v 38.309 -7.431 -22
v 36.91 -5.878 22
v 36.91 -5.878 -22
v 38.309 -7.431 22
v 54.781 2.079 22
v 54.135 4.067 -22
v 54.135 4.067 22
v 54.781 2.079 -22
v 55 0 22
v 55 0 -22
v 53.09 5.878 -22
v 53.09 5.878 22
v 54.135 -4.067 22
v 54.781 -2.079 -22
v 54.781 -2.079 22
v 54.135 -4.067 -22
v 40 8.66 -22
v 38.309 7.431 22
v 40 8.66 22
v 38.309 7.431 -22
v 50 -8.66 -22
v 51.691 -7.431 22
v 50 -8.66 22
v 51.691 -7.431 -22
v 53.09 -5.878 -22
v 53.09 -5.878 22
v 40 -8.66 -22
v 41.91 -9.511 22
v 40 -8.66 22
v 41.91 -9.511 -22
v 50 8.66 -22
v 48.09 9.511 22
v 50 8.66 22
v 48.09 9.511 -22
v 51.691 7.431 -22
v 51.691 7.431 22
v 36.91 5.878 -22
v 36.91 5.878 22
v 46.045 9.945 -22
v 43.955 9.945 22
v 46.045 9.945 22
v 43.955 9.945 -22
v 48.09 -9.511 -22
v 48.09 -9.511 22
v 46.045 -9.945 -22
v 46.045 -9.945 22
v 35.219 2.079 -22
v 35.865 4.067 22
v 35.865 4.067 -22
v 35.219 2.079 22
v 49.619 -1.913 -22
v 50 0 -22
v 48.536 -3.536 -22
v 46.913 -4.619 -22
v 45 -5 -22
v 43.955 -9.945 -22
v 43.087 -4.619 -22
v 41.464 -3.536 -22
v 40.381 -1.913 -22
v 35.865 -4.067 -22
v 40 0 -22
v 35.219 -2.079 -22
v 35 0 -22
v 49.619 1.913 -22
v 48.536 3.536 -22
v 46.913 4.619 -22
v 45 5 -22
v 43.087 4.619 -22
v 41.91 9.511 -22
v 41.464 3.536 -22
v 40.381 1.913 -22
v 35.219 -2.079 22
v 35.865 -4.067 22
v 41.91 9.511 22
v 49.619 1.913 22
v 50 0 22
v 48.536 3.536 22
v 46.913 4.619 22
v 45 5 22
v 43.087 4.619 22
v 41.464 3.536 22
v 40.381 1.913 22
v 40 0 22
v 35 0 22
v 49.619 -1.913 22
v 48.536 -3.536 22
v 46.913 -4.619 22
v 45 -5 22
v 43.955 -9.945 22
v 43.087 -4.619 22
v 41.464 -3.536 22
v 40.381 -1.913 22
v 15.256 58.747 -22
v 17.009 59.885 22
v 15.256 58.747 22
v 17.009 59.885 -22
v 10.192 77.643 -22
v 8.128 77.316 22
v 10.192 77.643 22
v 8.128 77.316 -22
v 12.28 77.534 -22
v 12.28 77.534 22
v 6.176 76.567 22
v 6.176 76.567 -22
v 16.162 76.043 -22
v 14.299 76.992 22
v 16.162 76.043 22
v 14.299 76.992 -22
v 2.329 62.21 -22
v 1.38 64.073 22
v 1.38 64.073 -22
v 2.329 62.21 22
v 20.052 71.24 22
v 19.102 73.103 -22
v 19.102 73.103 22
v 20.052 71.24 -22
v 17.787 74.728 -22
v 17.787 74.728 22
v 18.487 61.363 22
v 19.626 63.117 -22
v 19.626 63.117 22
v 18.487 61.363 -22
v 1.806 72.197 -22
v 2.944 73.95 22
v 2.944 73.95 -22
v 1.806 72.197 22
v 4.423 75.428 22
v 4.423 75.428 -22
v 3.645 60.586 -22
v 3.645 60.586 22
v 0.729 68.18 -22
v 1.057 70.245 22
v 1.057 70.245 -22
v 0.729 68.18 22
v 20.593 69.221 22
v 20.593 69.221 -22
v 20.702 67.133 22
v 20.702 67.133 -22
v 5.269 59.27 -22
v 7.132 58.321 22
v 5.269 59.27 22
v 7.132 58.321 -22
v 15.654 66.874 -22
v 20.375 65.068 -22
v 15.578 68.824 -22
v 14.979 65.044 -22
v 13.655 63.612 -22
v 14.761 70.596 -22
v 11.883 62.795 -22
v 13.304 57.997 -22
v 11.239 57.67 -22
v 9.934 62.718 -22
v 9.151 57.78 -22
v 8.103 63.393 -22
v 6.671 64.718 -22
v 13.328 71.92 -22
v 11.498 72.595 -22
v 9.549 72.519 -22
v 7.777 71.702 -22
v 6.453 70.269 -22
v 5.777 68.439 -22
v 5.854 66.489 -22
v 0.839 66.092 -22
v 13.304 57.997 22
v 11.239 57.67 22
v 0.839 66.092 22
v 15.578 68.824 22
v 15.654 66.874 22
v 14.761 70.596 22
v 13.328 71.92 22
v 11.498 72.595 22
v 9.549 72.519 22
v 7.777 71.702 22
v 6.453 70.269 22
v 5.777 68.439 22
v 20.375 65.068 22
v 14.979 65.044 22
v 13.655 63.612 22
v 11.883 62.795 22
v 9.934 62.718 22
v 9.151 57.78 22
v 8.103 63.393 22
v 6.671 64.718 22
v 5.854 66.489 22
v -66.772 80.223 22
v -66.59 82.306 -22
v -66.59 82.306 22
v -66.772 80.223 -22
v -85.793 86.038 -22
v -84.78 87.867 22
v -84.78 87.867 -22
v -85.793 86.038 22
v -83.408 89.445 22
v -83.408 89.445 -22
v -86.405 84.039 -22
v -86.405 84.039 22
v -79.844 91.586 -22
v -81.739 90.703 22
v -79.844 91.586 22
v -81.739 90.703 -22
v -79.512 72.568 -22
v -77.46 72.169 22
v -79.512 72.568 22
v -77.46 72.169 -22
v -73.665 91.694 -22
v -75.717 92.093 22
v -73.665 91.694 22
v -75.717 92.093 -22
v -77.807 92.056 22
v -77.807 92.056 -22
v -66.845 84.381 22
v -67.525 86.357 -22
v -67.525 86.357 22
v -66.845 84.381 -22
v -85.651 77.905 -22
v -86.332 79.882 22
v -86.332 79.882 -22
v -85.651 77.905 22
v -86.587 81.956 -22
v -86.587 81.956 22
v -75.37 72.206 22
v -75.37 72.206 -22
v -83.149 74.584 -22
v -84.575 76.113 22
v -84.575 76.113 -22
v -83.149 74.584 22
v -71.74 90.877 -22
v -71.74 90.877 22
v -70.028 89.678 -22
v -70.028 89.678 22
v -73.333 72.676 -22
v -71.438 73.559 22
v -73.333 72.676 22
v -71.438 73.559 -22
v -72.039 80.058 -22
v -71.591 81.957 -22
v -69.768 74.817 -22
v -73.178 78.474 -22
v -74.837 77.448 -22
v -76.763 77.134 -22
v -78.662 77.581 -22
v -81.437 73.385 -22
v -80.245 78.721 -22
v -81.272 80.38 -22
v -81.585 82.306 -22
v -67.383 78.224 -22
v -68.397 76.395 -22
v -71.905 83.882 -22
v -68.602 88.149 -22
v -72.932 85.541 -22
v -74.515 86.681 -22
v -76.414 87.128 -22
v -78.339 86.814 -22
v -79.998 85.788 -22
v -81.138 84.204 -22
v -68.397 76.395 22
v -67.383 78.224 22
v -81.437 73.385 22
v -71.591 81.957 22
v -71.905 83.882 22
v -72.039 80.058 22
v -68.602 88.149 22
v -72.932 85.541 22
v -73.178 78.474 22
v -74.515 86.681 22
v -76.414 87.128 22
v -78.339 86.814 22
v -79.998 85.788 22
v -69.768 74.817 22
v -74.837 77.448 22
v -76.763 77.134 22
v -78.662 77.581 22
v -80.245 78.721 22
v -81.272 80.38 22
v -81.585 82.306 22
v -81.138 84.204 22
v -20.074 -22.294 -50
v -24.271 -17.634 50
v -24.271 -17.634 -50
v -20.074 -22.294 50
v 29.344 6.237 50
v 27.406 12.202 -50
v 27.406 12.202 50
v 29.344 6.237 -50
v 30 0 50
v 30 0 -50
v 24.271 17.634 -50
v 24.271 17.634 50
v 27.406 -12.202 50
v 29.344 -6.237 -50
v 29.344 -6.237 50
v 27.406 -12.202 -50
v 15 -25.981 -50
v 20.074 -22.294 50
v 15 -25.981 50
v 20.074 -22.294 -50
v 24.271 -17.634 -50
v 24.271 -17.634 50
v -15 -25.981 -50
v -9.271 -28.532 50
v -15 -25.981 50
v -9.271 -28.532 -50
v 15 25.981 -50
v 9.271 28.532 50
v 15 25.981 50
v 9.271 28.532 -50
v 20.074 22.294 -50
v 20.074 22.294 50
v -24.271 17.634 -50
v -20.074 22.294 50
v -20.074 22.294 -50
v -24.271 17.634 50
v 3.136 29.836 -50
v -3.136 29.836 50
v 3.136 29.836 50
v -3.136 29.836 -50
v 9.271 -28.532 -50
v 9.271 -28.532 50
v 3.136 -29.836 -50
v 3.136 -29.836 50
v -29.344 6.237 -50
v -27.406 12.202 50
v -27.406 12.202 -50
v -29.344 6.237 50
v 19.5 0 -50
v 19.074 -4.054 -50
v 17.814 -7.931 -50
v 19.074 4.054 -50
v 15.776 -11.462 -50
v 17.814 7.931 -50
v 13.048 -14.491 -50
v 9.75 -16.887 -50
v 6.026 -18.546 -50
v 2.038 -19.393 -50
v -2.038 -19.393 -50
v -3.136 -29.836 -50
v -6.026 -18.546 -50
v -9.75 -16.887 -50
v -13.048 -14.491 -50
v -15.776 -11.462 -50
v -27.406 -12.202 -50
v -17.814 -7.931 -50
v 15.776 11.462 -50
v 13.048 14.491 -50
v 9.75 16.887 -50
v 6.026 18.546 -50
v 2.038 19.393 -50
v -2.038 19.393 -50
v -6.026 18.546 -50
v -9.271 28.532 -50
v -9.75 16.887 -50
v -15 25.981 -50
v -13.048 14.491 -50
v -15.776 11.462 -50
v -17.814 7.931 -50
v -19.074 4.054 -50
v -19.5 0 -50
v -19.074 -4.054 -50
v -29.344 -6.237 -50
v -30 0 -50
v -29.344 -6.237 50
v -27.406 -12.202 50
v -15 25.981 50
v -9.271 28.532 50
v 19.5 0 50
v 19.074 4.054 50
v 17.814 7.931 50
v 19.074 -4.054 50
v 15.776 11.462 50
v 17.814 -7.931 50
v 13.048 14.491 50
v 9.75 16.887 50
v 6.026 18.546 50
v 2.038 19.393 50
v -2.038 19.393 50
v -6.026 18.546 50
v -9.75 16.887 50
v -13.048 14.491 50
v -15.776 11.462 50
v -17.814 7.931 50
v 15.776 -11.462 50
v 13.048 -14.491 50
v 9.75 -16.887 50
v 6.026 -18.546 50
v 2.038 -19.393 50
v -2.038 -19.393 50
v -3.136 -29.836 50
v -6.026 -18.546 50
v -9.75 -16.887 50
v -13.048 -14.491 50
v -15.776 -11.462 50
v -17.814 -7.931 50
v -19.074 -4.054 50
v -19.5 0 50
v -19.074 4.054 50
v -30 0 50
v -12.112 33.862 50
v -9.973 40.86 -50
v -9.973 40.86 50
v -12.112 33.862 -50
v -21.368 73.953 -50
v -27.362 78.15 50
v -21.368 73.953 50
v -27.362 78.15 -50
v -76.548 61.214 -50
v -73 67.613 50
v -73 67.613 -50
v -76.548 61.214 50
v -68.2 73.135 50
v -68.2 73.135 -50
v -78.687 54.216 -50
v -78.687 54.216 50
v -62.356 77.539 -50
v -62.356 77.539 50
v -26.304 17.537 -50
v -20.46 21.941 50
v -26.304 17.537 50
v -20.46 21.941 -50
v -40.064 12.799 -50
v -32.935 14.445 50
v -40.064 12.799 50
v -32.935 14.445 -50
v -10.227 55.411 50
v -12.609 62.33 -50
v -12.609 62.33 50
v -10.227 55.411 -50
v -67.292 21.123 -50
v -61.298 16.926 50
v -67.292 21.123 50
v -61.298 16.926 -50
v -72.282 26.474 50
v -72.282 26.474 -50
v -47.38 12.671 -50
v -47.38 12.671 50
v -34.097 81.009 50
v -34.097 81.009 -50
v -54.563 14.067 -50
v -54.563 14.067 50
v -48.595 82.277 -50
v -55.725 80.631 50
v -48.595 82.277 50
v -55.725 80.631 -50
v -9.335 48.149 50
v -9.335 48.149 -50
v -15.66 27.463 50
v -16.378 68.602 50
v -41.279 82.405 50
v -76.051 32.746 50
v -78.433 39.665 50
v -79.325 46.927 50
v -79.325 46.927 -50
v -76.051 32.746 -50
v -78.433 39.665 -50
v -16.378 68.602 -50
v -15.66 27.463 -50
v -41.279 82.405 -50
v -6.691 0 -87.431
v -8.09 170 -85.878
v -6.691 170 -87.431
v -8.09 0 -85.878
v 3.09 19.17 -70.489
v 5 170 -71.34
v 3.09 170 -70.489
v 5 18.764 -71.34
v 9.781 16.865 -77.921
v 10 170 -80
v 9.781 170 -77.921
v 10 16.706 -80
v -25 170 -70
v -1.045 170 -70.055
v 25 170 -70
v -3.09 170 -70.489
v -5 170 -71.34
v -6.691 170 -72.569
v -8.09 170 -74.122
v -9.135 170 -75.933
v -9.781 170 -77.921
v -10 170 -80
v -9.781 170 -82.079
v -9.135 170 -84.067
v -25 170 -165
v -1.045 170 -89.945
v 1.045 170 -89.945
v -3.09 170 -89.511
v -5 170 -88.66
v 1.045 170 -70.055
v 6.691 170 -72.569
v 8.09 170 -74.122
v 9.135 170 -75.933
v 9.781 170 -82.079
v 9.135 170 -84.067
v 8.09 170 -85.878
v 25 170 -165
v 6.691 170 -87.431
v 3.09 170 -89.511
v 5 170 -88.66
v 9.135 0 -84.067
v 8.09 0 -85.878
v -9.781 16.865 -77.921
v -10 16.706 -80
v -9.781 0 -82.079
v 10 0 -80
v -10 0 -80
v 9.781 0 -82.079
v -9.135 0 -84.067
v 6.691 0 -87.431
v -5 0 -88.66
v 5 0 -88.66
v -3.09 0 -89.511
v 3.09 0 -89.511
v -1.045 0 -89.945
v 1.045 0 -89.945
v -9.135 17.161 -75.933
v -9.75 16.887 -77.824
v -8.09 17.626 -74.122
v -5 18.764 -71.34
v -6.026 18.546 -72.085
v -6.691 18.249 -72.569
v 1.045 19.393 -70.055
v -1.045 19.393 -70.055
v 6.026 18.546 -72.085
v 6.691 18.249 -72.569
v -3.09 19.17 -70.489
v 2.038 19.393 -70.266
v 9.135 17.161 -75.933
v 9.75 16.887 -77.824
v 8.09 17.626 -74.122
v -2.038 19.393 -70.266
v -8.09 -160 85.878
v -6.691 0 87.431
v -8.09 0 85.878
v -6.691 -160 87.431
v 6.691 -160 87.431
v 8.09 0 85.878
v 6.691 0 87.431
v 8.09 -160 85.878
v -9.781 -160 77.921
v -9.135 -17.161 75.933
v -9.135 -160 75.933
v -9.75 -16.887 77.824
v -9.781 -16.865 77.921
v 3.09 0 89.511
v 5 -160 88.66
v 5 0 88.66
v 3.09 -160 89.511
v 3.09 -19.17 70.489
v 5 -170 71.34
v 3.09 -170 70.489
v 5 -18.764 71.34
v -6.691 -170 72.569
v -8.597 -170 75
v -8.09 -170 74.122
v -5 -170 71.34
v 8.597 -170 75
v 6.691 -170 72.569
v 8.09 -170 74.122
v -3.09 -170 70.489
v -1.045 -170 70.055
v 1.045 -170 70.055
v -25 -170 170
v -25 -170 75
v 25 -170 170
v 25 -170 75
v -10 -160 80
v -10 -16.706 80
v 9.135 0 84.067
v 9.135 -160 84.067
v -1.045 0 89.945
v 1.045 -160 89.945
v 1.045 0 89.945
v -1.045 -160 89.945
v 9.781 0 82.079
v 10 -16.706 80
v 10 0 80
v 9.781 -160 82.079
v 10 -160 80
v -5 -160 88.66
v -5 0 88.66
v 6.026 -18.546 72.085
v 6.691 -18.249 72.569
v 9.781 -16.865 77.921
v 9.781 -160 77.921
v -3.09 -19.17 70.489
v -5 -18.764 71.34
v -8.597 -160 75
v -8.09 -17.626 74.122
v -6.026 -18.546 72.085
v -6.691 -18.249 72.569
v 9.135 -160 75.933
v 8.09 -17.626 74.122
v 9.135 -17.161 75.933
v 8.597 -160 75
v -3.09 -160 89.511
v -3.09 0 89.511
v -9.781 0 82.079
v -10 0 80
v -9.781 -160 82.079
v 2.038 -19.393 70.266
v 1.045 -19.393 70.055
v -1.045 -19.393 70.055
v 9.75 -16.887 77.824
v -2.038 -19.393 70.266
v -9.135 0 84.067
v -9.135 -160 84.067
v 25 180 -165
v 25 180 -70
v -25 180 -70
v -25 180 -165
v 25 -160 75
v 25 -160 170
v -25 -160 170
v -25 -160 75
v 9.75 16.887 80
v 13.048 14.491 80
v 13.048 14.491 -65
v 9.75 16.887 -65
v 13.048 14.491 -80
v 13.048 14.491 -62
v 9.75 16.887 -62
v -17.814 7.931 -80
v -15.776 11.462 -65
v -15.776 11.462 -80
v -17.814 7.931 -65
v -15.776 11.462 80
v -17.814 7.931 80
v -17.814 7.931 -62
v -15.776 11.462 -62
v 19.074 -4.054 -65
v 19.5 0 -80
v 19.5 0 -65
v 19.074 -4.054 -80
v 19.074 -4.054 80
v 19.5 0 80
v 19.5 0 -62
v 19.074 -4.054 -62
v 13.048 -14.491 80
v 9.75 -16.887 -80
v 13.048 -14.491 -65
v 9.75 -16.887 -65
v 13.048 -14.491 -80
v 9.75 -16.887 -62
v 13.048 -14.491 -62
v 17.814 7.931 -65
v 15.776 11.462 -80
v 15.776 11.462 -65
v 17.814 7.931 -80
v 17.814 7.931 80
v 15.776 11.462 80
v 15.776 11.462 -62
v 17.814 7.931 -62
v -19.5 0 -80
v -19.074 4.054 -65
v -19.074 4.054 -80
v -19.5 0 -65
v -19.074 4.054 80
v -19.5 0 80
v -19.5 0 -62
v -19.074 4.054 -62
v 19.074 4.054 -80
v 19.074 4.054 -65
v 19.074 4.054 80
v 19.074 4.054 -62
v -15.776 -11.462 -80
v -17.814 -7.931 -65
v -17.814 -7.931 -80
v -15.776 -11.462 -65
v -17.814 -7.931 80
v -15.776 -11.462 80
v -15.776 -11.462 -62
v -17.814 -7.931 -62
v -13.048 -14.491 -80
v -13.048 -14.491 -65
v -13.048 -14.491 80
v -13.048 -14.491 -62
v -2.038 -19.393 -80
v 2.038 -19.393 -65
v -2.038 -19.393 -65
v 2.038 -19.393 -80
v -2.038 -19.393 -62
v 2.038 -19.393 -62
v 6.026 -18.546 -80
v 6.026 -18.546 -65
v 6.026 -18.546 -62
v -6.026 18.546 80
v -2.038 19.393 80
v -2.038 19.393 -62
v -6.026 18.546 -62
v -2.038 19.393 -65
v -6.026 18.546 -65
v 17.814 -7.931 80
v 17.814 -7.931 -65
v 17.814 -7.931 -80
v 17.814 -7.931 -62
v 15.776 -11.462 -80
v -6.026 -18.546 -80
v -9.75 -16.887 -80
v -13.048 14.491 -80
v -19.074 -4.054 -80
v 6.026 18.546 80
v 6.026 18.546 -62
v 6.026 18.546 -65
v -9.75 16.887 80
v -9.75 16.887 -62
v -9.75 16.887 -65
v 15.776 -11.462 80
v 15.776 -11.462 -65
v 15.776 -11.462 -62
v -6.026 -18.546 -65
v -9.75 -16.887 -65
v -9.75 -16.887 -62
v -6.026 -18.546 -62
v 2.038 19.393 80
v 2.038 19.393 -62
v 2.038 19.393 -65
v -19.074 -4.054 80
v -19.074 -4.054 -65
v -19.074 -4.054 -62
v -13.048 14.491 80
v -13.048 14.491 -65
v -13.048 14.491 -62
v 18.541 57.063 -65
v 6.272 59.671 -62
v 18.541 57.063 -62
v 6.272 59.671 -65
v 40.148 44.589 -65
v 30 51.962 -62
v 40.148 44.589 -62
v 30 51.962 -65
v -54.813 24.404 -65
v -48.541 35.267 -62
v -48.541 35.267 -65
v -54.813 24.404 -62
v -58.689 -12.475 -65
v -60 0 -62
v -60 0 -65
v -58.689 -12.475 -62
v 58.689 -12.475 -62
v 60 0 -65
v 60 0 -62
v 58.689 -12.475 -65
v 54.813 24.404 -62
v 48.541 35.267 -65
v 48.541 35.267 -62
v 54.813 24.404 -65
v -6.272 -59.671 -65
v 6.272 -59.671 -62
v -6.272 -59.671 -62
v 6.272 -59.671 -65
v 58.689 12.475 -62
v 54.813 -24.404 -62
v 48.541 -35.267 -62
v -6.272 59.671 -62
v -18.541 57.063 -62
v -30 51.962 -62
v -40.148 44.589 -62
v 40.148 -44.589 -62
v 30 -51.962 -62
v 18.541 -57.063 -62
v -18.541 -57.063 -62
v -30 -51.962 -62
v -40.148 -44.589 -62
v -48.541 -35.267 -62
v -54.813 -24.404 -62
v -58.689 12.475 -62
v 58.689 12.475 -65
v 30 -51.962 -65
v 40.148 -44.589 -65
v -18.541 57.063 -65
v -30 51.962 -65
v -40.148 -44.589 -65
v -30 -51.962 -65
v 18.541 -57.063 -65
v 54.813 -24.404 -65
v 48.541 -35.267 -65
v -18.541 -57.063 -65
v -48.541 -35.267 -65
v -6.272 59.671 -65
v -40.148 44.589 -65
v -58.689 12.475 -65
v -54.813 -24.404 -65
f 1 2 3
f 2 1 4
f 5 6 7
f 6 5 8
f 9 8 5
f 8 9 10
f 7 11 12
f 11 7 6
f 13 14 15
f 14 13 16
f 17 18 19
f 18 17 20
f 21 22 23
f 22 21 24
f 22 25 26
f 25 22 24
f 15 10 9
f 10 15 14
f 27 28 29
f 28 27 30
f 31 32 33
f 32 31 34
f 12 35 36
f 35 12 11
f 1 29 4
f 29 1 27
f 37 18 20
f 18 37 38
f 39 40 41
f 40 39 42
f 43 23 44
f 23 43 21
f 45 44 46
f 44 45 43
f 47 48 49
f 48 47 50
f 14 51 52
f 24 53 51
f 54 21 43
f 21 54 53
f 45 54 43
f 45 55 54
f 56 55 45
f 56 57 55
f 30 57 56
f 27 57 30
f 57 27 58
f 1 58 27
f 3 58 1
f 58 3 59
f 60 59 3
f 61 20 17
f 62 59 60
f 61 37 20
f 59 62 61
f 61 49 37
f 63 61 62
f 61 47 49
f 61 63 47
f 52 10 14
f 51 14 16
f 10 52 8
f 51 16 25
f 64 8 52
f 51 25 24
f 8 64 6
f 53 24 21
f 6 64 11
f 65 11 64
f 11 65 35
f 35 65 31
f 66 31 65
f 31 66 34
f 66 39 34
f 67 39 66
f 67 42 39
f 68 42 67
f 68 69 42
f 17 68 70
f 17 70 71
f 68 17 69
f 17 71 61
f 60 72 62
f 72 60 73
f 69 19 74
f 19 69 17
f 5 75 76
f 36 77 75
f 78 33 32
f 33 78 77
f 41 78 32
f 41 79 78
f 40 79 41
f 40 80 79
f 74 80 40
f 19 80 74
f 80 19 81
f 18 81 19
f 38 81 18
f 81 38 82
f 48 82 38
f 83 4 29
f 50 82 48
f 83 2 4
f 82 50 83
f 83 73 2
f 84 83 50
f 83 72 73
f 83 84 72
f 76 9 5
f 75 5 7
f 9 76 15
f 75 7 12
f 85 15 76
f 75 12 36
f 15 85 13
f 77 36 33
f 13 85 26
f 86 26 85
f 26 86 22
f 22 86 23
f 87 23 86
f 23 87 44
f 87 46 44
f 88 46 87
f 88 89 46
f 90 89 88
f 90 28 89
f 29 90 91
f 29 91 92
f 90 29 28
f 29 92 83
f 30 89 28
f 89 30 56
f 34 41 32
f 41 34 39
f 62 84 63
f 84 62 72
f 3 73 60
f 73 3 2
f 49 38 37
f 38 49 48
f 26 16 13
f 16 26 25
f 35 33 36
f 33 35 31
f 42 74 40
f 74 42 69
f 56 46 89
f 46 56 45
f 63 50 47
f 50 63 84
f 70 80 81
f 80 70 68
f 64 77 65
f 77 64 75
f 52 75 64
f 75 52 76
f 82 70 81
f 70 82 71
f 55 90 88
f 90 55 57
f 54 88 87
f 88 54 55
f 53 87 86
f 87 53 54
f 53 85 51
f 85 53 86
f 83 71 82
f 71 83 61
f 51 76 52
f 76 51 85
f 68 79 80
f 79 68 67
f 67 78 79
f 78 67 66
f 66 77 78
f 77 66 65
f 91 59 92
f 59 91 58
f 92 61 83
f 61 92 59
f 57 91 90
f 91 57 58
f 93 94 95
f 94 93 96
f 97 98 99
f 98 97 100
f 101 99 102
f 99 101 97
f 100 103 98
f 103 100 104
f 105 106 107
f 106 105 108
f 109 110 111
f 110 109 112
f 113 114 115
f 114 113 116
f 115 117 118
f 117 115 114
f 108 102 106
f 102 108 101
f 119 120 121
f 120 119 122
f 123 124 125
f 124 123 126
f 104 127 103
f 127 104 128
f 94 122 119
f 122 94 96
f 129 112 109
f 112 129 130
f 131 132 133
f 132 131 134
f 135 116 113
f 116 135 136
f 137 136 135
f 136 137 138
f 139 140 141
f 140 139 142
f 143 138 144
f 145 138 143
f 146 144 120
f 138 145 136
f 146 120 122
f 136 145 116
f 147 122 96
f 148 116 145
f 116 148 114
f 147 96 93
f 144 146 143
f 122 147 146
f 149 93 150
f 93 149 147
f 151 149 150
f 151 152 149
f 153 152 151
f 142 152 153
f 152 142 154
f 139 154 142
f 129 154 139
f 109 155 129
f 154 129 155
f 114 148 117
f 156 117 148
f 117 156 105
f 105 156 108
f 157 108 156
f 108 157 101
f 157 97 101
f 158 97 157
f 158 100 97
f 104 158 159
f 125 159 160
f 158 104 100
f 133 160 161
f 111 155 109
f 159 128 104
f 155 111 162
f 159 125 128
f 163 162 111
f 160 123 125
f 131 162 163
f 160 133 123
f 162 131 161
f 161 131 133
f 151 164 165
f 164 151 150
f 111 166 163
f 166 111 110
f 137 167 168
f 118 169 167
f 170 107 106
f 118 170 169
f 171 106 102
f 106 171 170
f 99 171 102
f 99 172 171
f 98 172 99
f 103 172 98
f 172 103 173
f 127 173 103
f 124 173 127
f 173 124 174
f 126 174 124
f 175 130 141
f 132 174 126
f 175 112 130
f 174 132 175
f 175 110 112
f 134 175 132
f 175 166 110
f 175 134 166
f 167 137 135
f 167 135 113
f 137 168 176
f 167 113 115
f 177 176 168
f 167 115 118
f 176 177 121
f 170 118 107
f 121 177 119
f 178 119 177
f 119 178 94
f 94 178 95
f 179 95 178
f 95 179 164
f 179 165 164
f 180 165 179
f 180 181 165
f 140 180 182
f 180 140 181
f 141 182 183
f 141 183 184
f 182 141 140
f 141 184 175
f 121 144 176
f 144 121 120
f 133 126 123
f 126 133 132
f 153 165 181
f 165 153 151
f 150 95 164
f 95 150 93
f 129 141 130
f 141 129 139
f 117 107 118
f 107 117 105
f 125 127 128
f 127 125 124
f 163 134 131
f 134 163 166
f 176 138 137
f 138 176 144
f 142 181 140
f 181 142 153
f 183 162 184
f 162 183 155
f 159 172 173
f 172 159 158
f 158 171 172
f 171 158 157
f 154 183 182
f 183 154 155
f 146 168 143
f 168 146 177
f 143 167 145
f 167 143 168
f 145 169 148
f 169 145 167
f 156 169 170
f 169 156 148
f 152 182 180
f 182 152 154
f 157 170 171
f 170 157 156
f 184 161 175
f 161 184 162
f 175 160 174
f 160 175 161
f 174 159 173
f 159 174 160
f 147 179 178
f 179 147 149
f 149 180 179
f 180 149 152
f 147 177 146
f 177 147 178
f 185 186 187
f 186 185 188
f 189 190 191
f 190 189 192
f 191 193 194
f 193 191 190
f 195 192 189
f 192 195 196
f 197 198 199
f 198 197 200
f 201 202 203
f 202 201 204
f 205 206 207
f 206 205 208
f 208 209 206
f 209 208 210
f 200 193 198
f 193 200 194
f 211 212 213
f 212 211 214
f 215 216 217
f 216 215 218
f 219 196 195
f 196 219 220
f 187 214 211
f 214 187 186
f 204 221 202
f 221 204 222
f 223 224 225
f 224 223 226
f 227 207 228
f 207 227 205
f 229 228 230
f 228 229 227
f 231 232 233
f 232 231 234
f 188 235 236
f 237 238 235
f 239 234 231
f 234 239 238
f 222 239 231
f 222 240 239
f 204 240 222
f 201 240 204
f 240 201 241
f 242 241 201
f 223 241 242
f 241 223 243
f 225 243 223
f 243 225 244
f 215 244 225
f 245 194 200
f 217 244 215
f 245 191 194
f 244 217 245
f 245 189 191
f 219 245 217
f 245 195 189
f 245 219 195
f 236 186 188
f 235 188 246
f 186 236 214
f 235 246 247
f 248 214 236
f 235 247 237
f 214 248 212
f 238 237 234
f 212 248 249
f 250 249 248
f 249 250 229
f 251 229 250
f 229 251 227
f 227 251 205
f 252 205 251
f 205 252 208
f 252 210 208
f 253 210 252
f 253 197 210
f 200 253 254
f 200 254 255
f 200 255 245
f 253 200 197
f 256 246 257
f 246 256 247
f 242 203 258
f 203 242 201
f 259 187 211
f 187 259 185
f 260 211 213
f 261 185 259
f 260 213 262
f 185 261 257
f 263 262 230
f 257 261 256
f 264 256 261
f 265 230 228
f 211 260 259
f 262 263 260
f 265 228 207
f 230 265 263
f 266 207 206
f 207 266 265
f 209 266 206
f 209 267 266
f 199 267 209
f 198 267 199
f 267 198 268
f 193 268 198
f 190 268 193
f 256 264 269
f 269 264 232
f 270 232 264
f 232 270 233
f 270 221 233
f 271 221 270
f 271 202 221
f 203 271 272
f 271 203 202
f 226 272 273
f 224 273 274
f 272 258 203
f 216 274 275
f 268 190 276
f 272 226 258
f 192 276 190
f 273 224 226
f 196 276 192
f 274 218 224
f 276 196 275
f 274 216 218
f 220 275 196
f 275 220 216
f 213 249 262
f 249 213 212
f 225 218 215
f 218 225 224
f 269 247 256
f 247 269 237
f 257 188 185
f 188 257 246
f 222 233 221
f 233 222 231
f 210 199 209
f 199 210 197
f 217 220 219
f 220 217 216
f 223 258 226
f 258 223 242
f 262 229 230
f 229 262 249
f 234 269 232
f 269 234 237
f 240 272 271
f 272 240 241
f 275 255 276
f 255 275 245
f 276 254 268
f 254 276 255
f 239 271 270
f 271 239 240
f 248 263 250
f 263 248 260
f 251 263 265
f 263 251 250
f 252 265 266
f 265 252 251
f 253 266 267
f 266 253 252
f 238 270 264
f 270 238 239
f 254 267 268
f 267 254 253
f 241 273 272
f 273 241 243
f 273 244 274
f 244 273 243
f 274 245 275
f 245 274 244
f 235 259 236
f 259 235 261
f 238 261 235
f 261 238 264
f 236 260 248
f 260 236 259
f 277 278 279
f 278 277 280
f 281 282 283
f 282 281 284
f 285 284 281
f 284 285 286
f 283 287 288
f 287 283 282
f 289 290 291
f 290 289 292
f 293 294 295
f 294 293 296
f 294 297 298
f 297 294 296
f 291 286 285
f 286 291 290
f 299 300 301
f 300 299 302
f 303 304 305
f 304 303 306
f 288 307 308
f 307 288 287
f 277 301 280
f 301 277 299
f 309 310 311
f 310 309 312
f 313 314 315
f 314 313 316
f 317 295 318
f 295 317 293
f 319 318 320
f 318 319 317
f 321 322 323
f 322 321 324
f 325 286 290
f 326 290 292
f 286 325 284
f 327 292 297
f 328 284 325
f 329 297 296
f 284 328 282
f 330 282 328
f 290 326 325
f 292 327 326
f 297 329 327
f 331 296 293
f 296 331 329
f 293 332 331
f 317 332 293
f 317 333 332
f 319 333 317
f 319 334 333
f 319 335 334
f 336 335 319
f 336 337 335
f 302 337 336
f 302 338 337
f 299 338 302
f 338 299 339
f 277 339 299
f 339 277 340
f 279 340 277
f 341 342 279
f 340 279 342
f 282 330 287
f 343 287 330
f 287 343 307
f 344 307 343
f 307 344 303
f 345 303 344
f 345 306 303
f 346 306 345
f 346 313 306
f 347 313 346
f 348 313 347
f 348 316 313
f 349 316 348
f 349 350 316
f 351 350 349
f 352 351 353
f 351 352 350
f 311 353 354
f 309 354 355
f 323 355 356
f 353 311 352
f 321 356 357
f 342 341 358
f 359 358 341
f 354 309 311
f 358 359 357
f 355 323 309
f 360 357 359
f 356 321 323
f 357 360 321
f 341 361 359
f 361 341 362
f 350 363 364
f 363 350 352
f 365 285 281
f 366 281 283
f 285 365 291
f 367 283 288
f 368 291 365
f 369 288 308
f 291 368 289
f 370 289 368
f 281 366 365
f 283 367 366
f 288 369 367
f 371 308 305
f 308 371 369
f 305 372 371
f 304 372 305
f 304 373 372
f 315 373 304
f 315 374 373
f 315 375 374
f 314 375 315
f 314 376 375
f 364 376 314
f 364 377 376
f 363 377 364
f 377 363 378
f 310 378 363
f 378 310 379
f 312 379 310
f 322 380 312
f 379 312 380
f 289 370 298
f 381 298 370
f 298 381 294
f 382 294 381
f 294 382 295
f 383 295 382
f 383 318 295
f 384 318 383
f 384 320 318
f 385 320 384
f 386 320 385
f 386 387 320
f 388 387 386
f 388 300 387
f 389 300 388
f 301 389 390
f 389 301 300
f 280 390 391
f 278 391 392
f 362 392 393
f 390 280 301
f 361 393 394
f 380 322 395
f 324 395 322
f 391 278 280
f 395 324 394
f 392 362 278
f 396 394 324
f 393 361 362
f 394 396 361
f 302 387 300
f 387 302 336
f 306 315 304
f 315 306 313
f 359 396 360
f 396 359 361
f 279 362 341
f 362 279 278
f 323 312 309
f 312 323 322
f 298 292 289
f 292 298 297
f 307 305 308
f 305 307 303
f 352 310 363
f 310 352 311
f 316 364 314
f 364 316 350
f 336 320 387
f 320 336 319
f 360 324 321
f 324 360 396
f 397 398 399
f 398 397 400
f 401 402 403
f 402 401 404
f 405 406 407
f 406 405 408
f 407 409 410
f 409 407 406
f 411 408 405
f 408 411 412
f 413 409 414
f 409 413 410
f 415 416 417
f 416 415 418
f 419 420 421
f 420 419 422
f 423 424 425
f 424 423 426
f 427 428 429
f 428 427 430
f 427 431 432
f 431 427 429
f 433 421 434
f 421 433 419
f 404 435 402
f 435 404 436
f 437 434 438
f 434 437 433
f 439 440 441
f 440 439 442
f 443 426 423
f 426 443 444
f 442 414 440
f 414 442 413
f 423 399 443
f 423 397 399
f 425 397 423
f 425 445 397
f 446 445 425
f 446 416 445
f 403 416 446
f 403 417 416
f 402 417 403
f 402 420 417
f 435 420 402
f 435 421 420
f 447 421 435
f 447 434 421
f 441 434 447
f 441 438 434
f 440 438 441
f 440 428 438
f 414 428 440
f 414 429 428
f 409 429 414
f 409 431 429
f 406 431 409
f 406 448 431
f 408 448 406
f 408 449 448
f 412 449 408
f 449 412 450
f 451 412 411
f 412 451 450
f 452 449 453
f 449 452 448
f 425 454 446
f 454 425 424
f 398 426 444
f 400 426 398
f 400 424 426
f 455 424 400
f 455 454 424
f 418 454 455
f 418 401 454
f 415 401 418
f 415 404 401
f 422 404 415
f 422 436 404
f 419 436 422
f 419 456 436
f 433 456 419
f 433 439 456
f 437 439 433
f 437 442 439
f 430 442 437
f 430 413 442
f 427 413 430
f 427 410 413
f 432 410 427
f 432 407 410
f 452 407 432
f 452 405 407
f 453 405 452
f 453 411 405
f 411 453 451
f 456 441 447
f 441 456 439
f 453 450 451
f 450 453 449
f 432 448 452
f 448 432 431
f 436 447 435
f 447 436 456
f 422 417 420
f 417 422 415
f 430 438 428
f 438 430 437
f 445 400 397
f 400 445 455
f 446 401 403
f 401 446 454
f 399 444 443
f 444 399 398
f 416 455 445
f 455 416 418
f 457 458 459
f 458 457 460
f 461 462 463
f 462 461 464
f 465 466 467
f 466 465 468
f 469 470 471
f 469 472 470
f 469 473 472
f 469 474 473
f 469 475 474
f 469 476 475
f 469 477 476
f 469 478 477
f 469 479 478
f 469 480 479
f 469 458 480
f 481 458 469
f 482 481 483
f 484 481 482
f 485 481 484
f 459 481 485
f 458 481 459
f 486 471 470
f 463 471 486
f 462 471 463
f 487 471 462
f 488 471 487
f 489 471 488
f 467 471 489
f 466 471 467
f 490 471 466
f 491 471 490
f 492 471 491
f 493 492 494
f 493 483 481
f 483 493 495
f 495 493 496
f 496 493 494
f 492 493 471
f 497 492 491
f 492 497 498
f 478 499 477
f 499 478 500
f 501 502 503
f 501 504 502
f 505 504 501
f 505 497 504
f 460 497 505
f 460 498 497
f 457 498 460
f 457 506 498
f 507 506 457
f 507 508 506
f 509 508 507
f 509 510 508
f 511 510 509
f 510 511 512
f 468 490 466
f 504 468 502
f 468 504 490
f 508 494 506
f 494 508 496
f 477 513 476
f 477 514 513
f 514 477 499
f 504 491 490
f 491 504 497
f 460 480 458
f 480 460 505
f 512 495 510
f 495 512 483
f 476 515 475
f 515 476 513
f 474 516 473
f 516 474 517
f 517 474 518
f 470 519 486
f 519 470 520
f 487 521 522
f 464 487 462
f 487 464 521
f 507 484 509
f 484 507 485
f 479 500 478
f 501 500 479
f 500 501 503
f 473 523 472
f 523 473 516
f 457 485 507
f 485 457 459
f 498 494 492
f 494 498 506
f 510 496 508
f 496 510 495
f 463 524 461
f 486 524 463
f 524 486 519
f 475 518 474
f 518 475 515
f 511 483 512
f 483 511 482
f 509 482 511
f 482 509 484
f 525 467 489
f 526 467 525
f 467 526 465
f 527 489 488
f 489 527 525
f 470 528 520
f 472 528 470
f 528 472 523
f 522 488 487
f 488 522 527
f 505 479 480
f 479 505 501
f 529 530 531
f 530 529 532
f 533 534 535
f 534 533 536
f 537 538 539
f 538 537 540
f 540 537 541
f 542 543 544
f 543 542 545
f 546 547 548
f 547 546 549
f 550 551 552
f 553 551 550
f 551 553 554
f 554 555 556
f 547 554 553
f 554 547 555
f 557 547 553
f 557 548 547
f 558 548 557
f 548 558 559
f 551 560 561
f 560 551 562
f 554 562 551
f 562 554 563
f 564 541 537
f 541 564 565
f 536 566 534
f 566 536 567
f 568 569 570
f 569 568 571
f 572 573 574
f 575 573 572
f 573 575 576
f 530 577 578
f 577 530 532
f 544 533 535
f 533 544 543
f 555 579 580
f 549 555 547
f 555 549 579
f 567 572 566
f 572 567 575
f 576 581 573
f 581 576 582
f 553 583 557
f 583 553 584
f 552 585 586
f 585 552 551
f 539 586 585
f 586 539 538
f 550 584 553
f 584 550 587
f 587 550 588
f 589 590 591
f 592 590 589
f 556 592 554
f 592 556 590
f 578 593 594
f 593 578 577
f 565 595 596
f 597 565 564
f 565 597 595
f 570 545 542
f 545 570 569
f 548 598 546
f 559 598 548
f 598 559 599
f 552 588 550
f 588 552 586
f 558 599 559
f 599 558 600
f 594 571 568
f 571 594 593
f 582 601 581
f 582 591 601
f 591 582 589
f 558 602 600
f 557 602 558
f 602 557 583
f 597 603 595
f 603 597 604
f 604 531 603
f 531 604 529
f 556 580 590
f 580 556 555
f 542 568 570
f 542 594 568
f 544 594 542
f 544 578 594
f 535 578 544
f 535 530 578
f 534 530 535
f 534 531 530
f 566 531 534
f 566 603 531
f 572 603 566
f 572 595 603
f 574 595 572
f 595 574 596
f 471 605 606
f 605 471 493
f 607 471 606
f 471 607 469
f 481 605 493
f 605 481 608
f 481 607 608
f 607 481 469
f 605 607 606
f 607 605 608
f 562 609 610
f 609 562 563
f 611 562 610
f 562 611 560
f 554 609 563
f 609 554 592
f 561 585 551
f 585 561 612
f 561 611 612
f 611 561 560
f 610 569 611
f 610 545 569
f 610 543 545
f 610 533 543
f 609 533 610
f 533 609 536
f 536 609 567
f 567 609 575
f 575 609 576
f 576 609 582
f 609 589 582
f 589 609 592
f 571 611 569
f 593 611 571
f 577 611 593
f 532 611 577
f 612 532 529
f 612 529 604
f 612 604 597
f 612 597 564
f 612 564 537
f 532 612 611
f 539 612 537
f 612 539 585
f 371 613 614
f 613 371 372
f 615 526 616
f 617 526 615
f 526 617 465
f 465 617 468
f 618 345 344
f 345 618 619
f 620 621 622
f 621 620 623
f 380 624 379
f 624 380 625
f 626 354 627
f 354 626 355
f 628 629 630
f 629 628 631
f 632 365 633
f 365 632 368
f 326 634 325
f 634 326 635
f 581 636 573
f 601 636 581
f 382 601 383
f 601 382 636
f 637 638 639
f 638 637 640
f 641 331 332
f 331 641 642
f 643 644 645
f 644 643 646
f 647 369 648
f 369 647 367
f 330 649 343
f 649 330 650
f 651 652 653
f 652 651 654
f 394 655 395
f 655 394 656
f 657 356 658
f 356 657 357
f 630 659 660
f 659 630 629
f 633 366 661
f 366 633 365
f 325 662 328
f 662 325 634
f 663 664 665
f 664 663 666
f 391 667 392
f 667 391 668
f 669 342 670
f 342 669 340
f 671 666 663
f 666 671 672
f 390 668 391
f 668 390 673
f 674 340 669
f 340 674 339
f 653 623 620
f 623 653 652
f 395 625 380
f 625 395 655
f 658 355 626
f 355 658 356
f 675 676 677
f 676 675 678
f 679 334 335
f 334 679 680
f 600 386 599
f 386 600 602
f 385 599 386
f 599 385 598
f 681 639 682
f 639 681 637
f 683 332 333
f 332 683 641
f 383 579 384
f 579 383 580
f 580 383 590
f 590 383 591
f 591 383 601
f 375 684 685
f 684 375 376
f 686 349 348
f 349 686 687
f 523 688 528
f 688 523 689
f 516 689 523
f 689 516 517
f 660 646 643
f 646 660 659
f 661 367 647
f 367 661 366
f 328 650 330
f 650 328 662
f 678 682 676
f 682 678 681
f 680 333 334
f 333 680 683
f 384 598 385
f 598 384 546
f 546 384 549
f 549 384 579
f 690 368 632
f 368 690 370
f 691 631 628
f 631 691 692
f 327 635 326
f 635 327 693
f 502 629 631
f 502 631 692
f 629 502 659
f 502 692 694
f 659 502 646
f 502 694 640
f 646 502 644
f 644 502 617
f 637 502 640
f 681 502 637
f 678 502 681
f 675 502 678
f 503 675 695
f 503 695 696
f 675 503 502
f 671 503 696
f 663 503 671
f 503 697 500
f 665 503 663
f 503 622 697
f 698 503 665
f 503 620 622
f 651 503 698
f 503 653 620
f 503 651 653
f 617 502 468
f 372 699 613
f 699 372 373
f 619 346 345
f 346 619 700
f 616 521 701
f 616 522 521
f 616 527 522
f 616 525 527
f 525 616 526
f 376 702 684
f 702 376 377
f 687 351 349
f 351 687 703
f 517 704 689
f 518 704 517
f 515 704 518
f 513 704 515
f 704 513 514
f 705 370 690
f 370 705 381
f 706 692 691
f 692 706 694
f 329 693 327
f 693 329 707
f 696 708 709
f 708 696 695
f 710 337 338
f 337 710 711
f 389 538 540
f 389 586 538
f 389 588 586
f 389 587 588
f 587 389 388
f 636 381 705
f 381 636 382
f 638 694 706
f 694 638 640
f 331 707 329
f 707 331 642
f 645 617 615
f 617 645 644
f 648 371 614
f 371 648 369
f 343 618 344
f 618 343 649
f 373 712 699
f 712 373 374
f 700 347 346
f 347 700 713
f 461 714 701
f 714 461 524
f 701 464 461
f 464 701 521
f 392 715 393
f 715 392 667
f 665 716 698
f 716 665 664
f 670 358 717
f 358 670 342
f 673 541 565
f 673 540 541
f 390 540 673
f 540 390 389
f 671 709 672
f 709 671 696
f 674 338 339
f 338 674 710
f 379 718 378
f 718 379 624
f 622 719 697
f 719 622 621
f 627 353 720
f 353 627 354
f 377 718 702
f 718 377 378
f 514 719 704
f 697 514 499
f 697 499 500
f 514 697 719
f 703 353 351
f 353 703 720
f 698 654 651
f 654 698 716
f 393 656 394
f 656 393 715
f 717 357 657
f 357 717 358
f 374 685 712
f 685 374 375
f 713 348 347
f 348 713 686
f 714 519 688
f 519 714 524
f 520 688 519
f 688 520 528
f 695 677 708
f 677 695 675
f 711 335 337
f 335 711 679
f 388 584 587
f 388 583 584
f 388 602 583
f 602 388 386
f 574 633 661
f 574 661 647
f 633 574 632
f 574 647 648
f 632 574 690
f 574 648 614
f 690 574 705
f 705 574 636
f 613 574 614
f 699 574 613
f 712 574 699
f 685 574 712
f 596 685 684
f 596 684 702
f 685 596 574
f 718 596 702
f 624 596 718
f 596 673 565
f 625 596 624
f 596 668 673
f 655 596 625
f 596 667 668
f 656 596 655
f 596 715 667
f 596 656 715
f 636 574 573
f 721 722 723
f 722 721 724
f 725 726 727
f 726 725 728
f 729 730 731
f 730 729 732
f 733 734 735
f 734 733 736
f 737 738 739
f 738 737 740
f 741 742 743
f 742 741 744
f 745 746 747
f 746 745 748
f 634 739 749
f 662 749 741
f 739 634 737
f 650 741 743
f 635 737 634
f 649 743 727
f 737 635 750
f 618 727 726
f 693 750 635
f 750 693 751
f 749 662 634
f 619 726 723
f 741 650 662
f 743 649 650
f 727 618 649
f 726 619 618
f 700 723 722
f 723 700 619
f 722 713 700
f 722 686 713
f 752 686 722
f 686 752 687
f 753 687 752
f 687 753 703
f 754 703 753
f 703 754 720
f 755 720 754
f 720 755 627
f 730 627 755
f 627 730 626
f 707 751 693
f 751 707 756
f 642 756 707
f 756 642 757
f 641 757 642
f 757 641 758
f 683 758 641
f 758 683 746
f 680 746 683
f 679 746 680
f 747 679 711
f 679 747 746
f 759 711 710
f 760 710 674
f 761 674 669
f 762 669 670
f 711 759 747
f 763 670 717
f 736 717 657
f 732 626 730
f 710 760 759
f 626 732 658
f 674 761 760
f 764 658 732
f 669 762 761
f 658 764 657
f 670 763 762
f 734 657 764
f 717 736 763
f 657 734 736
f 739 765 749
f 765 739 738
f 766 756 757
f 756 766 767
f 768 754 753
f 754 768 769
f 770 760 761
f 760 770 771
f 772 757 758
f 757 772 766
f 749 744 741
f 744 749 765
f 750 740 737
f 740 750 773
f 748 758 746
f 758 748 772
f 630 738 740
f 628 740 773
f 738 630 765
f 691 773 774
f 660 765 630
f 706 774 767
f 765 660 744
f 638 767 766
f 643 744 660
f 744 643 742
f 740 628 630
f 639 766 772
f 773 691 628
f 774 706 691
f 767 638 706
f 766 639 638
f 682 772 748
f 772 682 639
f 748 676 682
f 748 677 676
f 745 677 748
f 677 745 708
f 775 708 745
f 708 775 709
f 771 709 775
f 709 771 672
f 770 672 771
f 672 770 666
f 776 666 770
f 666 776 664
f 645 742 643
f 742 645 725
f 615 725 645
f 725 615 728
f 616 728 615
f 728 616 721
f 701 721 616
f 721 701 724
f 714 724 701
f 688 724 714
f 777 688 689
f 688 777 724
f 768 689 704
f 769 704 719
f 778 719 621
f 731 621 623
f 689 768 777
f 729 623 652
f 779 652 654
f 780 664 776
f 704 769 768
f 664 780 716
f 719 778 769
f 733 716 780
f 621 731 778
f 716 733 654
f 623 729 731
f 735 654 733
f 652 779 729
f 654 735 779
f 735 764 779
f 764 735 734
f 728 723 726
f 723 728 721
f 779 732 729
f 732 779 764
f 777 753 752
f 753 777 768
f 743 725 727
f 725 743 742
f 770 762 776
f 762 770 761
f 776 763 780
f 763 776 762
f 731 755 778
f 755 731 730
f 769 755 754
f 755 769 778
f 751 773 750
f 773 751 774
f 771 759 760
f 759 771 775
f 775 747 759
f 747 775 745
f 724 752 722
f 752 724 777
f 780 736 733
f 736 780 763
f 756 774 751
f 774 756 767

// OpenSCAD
// Solar-Bear
// A hybrid trike: powered by Sun and muscles!
// https://github.com/solar-b

// Maker: Mihai Oltean
// https://mihaioltean.github.io

// License: MIT

// last update 2026.07.10
//---------------------------------------------------------------------------------------
module wheel(radius, thick, shaft_thick = 7, small_hub_length = 112)
{
    color("blue"){
    // wheel
        difference(){
            cylinder(h = thick, r = radius, center = true);
            translate ([0, 0, -1])
                cylinder(h = thick + 4, r = radius - 50, center = true);
        }
        // hub big
        cylinder(h = 85, r = 17.5, center = true);
        // hub
        cylinder(h = small_hub_length, r = 11, center = true);
        //ax
        cylinder(h = 180, r = shaft_thick, center = true);
        
//spokes
        for (i=[0:20])
            rotate([0, 0, i*18])
                rotate([0, 90, 0])
                    cylinder(h = radius, r = 2);
    }
}
//---------------------------------------------------------------------------------------
module wheel_with_gears(radius, thick, _shaft_thick = 7, gear_thick = 2, gear_radius = 45, hub_length = 112)
{
    wheel(radius, thick, _shaft_thick, hub_length);
    translate([0, 0, -45])
        cylinder(h = gear_thick, r = gear_radius);
}
//---------------------------------------------------------------------------------------
module wheel_with_break_disk(radius, thick, shaft_thick = 7, break_disk_radius = 80, _hub_length = 112)
{
    wheel(radius, thick, shaft_thick, _hub_length);
    // break
    translate([0, 0, -43]) 
        cylinder(r = break_disk_radius, h = 2);
}
//---------------------------------------------------------------------------------------
module crank(arm_length, arm_pos_angle, disk_radius = 60)
{
    color("Magenta"){
        rotate([0, 0, arm_pos_angle]){
            cylinder(h = 70, r = 30, center = true);
//arms
        translate([0, 0, -80])
            rotate([-90, 0, 0])
                cylinder(h = arm_length, r = 10);
                
            translate([0, 0, 80])
            rotate([90, 0, 0])
                cylinder(h = arm_length, r = 10);
                
        // pedals
            translate([-25, arm_length, -165])
                cube([50, 10, 95]);
                
            translate([-25, -arm_length, 75])
                cube([50, 10, 95]);
        }
        // shaft
        cylinder(h = 160, r = 19.5, center = true);
        // disk 
        translate([0, 0, -65])
        cylinder(h = 3, r = disk_radius);
    }
}

//---------------------------------------------------------------------------------------
module Bafang_M820()
{
    // pedal shaft
    difference(){
        cylinder(h = 148, r = 15, center = true);
        cylinder(h = 152, r = 10, center = true);
    }
    cylinder(h = 100, r = 30, center = true);
    
    // holes support
    translate([45, 0, 0])
        difference(){
            cylinder(h = 44, r = 10, center = true);
            cylinder(h = 46, r = 5, center = true);
        }
        
        
    rotate([0, 0, 81])
    translate([68.5, 0, 0])
        difference(){
            cylinder(h = 44, r = 10, center = true);
            cylinder(h = 46, r = 5, center = true);
        }
        
    rotate([0, 0, 133])
    translate([112.3, 0, 0])
        difference(){
            cylinder(h = 44, r = 10, center = true);
            cylinder(h = 46, r = 5, center = true);
        }
        
// motor        
    rotate([0, 0, 133])
    translate([65, 0, 0])
        cylinder(h = 100, r = 35, center = true);
}
//---------------------------------------------------------------------------------------
module motor_with_cranks(arm_length, arm_pos_angle, disk_radius = 60)
{

    Bafang_M820();
    
    //arms
    translate([0, 0, -80])
        rotate([-90, 0, 0])
            cylinder(h = arm_length, r = 10);
            
        translate([0, 0, 80])
        rotate([90, 0, 0])
            cylinder(h = arm_length, r = 10);
            
    // pedals
        translate([-25, arm_length, -165])
            cube([50, 10, 95]);
            
        translate([-25, -arm_length, 75])
            cube([50, 10, 95]);
    
    // shaft
    cylinder(h = 160, r = 19.5, center = true);
    // disk 
    translate([0, 0, -65])
        cylinder(h = 3, r = disk_radius);
        
}
//---------------------------------------------------------------------------------------
module trike_seat(angle)
{ // not the real one
    color("Green"){
        cube([250, 450, 40]);
        translate([250, 25, 40])
            rotate([0, angle, 0]) 
                cube([30, 400, 600]);
    }
}
//---------------------------------------------------------------------------------------


//wheel(radius = 270, 50, 10, 130);

//wheel_with_gears(radius = 270, thick = 50, _shaft_thick = 7, gear_thick = 2, gear_radius = 45, hub_length = 130);

//Bafang_M820();

motor_with_cranks(arm_length = 170, arm_pos_angle = 0, disk_radius = 60);

//crank(100, 10, 60);
